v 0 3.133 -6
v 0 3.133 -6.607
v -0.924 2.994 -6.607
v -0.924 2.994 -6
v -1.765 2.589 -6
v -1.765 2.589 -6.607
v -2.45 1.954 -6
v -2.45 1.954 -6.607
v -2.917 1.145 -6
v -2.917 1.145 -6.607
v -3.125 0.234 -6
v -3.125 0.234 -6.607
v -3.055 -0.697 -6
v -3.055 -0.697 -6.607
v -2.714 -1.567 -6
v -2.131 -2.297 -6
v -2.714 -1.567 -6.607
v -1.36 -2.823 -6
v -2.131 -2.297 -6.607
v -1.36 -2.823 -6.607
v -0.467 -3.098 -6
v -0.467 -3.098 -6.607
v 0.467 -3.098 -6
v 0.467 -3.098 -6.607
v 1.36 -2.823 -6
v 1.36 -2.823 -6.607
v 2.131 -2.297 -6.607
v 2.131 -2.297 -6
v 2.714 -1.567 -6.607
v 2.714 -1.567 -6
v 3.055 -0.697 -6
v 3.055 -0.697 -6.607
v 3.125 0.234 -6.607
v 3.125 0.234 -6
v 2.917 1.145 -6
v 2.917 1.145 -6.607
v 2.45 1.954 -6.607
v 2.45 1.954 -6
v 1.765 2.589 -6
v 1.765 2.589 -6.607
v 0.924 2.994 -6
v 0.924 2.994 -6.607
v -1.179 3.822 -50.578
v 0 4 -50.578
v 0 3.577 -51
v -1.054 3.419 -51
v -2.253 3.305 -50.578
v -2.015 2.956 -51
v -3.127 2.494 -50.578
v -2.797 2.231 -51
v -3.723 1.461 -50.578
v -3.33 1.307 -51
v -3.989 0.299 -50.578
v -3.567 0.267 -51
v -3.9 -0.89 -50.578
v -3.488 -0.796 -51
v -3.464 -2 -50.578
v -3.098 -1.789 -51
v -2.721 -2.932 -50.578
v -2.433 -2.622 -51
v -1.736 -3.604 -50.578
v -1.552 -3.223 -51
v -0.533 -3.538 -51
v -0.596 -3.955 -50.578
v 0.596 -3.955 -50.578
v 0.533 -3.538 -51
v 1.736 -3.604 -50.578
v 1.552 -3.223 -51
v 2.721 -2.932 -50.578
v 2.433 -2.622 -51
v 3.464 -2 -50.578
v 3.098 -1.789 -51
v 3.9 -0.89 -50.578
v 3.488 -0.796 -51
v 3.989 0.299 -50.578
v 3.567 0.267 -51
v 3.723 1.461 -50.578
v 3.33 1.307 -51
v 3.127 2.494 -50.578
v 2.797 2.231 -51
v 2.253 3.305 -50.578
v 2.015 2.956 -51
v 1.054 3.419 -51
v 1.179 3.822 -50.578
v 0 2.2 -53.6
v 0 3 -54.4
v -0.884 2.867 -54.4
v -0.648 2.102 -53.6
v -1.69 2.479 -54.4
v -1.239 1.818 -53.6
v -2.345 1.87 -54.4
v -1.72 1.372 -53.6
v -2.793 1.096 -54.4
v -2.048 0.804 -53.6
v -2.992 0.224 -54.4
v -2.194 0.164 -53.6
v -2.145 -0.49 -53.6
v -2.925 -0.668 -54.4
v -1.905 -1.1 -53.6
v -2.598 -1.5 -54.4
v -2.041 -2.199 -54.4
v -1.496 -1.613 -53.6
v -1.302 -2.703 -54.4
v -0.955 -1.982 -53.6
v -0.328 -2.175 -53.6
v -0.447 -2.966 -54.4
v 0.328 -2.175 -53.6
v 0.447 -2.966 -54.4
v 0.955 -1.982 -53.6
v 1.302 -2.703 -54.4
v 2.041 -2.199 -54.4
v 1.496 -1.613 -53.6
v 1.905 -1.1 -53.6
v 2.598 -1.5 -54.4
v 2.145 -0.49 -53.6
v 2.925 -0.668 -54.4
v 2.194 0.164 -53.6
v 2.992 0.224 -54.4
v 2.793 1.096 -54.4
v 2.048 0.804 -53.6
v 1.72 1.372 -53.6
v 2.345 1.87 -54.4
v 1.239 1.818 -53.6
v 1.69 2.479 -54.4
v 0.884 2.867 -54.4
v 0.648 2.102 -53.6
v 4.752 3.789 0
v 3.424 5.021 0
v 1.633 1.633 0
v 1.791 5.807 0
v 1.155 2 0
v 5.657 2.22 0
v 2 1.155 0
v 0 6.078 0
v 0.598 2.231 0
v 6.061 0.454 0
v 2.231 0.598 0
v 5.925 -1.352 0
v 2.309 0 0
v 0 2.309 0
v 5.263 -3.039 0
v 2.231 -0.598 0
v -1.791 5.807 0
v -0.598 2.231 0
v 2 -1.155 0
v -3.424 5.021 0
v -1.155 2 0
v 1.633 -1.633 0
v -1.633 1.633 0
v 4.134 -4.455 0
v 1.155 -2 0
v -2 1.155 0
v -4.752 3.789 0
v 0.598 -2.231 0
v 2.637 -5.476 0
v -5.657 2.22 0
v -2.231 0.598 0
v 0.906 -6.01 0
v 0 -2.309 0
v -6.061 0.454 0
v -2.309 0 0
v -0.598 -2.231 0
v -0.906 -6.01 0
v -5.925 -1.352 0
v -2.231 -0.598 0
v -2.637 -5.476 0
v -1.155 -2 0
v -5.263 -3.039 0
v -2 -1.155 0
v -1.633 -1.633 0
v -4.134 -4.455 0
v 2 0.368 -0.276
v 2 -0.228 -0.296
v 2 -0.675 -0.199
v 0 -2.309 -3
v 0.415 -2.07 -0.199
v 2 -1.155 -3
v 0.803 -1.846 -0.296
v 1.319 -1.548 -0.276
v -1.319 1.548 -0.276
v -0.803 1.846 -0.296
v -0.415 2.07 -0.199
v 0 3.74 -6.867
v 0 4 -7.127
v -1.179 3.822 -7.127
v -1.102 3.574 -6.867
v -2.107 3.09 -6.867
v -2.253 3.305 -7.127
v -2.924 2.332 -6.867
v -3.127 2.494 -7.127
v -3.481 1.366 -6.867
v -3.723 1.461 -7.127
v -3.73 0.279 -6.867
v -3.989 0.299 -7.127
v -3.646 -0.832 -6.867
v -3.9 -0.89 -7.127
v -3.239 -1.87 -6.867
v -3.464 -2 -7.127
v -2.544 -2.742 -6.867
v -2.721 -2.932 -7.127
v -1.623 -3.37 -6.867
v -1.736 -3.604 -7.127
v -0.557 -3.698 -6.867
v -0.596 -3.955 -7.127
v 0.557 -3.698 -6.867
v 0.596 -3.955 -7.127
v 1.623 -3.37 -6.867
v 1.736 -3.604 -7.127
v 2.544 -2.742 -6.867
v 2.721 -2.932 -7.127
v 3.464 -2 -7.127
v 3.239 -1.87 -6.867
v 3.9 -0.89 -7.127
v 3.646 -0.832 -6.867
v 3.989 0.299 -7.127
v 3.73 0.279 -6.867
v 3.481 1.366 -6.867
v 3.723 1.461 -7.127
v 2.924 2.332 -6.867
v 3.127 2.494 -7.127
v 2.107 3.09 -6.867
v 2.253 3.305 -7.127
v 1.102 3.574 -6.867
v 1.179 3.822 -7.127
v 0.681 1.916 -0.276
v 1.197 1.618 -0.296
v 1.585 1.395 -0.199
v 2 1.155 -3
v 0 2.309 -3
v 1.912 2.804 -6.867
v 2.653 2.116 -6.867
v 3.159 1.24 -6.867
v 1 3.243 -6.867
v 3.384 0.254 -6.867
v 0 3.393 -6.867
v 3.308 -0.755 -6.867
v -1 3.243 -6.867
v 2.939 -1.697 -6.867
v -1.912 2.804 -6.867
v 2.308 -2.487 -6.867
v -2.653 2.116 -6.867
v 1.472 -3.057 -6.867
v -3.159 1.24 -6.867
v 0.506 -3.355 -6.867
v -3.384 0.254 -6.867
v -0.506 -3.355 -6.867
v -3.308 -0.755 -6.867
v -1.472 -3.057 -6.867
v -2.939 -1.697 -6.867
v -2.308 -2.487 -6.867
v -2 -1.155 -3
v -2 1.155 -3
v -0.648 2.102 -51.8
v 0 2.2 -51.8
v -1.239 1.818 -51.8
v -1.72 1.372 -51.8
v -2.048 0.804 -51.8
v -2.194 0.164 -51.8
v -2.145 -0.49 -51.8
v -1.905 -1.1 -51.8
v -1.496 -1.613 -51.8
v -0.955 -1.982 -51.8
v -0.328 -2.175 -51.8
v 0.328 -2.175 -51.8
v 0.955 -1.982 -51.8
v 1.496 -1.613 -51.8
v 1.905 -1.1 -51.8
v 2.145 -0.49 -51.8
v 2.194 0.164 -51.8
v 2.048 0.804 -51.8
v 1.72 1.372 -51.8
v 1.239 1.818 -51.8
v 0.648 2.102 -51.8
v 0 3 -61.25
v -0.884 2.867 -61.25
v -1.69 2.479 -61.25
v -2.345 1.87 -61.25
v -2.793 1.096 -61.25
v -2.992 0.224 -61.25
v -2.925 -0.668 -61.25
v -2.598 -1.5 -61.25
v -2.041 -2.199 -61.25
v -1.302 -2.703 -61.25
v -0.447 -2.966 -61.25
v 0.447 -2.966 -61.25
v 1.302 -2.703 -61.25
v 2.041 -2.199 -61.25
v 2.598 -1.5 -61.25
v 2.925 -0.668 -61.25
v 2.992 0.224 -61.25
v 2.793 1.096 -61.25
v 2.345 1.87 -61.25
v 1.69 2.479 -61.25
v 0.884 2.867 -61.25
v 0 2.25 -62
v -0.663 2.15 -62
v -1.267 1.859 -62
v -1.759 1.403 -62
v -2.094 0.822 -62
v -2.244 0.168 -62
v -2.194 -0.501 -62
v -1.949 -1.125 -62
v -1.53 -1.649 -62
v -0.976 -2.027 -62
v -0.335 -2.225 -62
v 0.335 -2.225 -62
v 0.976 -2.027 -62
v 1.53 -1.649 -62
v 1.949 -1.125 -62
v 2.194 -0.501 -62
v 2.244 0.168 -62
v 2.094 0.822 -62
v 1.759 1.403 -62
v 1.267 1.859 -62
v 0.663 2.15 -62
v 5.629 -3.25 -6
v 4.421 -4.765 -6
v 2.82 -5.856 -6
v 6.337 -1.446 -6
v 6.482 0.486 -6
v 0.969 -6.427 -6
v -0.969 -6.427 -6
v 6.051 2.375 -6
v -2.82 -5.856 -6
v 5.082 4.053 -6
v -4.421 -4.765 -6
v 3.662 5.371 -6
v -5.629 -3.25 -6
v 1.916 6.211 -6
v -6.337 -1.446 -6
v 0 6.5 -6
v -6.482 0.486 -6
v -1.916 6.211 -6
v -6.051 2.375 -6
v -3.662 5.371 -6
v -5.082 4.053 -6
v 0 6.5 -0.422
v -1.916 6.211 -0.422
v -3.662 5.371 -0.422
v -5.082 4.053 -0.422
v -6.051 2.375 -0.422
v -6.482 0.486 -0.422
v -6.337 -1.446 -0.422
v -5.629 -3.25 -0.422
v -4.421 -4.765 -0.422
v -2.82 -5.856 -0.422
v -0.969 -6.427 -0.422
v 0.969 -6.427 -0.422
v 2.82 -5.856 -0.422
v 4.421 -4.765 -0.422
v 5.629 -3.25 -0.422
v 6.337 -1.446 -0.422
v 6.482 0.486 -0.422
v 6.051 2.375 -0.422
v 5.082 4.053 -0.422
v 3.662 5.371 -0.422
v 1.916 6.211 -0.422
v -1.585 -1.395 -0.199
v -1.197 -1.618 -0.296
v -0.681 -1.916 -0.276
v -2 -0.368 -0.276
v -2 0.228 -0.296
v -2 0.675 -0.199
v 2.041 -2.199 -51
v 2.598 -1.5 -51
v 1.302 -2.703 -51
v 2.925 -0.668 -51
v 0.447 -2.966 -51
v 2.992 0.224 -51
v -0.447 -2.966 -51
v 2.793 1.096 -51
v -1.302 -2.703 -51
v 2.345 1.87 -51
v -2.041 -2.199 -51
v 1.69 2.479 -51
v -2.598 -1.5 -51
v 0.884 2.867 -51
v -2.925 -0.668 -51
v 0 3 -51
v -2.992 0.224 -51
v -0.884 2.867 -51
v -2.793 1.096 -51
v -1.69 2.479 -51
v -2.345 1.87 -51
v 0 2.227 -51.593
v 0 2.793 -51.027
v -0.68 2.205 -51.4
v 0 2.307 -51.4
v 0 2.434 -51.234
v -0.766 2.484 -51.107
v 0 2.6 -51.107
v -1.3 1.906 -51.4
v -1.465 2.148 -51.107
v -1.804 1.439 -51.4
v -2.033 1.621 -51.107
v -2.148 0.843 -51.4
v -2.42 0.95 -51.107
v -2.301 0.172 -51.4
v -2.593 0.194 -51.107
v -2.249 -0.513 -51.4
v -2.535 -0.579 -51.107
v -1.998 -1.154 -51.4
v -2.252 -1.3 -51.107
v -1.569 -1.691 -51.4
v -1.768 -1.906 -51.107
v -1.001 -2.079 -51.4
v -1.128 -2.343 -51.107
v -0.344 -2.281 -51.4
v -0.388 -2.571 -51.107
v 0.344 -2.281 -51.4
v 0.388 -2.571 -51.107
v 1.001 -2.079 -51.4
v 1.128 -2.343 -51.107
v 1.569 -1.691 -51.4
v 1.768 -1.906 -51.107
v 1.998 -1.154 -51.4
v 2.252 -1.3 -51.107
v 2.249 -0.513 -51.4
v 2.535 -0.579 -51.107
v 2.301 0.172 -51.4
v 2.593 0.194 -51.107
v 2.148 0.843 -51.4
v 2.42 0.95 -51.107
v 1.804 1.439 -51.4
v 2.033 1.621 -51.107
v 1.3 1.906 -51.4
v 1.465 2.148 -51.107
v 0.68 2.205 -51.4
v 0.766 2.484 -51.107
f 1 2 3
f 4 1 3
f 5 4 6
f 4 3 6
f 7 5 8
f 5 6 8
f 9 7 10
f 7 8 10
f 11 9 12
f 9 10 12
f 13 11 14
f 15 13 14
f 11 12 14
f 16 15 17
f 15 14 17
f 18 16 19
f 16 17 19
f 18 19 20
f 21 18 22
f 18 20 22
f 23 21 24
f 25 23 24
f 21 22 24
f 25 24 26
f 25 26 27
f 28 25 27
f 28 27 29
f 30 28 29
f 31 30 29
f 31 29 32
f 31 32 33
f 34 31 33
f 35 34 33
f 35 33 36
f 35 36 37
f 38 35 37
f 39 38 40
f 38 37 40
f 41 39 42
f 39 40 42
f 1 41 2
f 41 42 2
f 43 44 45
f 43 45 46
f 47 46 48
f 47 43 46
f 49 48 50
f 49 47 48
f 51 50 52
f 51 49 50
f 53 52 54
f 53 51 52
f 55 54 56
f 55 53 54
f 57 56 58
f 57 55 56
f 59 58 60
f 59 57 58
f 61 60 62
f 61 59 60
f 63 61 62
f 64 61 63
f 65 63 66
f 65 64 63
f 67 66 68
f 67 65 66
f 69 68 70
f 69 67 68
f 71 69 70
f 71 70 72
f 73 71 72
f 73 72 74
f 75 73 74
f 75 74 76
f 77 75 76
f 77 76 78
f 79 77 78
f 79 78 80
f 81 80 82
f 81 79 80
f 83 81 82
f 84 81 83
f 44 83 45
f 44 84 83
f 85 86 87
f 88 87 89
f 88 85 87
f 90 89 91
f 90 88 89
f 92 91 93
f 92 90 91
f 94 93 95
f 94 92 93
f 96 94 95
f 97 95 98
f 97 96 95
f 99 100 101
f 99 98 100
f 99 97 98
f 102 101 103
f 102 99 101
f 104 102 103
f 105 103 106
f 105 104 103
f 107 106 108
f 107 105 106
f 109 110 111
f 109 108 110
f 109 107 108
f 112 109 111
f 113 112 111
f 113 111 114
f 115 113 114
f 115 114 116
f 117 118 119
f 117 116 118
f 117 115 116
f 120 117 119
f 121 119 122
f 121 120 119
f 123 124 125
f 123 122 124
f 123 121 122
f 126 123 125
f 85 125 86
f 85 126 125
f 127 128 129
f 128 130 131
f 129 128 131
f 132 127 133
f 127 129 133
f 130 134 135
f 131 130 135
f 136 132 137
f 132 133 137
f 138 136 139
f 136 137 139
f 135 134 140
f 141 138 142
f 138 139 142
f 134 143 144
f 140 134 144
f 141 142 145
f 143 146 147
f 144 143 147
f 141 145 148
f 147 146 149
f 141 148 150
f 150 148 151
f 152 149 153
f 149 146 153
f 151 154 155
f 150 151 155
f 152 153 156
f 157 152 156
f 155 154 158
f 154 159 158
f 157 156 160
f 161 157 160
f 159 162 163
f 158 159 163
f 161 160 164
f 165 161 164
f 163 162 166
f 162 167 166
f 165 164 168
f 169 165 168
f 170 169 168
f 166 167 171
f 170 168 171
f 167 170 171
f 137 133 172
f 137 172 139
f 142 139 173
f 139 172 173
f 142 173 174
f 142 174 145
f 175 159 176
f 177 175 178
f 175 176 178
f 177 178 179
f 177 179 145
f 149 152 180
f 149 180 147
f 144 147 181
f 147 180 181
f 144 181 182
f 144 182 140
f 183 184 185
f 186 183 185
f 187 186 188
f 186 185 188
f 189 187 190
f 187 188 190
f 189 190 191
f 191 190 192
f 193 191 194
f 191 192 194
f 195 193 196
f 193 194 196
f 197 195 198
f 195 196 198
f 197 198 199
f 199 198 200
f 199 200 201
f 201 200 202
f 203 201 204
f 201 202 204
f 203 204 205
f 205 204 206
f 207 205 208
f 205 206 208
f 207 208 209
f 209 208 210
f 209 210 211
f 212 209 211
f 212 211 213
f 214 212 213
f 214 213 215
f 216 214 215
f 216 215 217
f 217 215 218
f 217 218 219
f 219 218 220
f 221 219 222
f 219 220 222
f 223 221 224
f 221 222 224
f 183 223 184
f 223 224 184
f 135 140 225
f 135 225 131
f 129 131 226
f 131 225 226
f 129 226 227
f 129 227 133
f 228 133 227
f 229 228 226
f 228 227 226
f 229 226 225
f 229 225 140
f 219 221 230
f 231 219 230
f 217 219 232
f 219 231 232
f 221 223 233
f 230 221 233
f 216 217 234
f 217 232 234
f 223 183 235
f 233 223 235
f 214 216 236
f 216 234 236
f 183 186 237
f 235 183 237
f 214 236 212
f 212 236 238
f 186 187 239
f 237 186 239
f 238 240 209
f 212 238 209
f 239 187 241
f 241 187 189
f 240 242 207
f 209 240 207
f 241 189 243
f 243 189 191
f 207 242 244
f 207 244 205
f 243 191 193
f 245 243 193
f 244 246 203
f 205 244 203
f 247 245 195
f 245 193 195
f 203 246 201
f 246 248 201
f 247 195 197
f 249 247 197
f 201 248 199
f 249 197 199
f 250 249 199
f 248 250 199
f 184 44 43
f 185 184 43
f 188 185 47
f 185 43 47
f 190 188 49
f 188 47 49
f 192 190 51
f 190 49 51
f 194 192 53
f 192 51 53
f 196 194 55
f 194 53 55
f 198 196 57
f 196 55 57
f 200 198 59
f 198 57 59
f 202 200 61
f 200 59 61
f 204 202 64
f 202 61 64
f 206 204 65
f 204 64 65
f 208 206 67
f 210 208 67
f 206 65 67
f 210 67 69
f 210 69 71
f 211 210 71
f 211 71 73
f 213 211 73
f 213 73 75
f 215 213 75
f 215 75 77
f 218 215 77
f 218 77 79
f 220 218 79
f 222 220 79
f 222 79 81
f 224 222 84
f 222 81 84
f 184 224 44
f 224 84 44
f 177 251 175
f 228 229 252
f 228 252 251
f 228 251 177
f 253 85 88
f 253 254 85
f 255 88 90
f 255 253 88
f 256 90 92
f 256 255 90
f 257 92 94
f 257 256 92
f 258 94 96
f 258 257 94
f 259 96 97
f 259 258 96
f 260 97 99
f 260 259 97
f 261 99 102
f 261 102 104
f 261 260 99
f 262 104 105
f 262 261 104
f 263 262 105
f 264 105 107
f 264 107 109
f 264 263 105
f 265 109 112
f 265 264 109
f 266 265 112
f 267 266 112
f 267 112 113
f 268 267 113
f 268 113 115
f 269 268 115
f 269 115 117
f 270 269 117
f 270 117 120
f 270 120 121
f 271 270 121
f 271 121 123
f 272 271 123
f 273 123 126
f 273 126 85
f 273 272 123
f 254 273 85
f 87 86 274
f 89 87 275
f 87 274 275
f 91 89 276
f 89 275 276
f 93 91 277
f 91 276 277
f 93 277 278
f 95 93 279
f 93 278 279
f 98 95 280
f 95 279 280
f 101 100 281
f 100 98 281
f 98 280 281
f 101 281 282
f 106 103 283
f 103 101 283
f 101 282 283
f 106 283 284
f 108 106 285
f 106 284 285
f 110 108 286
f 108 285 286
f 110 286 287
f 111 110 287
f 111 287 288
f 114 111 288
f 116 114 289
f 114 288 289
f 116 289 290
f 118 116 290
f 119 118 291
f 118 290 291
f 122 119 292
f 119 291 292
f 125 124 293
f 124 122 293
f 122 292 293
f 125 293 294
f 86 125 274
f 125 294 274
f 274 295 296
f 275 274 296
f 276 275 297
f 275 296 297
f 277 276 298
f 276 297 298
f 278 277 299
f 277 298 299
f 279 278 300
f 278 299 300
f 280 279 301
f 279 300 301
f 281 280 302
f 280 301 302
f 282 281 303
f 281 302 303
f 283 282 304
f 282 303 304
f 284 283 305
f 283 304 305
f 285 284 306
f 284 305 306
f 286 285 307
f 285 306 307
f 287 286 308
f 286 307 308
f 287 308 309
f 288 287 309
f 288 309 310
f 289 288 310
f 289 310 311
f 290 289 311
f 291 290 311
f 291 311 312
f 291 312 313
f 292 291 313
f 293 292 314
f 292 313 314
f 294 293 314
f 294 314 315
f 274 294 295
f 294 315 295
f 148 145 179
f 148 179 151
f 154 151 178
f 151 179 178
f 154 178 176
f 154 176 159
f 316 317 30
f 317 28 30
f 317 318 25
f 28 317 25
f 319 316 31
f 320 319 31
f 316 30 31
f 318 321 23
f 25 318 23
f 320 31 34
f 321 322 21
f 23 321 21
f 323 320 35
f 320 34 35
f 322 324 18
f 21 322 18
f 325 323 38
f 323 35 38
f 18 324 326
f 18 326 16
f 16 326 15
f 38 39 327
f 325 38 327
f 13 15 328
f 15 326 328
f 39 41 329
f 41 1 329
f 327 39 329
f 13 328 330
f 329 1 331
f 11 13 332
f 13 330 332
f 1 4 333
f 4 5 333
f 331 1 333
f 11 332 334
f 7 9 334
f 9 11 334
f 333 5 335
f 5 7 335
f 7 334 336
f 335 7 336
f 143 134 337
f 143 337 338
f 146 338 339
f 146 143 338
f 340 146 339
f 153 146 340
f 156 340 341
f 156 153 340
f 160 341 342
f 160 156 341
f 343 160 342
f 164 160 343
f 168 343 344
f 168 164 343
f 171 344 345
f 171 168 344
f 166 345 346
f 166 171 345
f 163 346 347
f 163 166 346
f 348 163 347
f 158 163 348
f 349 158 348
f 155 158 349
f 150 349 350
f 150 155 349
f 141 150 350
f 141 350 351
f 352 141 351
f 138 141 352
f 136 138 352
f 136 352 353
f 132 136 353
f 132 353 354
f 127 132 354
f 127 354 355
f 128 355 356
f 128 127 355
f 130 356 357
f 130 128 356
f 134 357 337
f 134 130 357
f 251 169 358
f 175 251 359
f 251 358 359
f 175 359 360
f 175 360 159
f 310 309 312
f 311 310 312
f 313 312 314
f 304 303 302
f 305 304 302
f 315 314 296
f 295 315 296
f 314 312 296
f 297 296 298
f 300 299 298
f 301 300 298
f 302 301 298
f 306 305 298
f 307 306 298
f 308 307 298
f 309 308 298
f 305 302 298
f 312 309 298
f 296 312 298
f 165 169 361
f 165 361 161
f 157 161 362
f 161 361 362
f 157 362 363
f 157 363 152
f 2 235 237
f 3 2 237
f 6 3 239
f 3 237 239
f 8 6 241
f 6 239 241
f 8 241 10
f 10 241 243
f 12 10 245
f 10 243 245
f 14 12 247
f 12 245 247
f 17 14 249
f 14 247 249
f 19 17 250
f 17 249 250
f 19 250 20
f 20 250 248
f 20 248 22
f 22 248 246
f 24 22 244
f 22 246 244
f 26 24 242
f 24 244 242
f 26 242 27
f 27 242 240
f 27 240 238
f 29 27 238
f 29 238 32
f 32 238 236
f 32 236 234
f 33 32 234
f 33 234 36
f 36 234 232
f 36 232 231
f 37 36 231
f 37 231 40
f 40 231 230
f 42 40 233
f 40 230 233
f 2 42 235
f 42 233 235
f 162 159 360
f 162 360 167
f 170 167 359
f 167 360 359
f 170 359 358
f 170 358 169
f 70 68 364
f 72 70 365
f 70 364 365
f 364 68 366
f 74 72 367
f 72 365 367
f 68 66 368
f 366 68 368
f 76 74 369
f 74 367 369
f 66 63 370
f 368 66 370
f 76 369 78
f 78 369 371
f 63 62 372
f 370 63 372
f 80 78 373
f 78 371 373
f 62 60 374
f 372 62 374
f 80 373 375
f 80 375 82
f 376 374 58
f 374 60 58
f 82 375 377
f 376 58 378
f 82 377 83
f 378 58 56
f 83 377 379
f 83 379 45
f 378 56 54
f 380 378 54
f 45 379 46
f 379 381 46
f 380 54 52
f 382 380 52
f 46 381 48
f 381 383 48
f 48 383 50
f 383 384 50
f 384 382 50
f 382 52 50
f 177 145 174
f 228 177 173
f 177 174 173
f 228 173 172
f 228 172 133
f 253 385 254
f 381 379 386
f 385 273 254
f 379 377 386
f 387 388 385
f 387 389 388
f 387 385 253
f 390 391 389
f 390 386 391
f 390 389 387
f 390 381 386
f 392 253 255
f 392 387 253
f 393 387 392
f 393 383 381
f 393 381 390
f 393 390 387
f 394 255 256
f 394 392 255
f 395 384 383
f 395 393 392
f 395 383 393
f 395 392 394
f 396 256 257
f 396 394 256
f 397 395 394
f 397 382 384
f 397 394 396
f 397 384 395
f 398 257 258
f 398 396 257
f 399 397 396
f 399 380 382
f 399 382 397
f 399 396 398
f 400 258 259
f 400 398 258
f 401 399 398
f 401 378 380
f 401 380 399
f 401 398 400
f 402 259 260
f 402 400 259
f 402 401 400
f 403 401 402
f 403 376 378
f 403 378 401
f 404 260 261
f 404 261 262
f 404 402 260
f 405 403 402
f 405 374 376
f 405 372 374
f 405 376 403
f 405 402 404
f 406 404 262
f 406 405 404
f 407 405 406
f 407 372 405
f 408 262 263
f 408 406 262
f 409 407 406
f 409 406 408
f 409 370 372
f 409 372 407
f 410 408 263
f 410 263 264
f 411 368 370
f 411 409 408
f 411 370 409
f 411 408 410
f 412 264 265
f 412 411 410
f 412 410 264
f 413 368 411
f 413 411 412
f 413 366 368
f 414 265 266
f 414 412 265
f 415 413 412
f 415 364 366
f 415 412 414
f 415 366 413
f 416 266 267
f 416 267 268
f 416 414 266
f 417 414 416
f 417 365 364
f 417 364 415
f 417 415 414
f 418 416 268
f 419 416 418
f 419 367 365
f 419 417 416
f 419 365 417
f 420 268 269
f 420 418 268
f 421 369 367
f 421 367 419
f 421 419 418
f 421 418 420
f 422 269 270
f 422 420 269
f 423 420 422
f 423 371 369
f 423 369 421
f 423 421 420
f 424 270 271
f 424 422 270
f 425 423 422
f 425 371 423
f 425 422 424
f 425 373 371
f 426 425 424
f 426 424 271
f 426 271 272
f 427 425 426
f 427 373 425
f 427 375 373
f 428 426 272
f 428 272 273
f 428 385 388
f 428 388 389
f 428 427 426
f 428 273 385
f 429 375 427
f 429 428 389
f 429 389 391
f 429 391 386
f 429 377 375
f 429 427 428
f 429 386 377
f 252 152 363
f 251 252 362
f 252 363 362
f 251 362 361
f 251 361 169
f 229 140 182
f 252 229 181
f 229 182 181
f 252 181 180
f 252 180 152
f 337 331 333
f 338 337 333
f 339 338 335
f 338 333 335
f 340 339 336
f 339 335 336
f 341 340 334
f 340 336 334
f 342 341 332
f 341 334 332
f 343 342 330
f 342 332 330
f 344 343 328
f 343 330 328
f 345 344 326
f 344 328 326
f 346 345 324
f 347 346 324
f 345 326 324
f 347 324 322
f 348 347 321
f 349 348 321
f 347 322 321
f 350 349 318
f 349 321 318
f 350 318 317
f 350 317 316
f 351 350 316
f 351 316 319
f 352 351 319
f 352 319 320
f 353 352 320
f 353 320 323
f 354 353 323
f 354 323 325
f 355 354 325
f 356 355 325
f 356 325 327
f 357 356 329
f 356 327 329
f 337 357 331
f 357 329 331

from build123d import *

# Parameters (mm, degrees)
SKETCH12_W         = 0.866666667
SKETCH12_H         = 0.866666667
CHAMFER3_SIZE      = 0.26
CHAMFER1_SIZE      = 0.75
CHAMFER2_SIZE      = 0.4225
CUT_EXTRUDE2_DEPTH = 3


with BuildPart() as part:
    # Sketch1 → Revolve1 (revolve)
    with BuildSketch(Plane(origin=(0, 0, 0), x_dir=(0, 0, -1), z_dir=(1, 0, 0))):
        Polygon((0, 6.5), (6, 6.5), (6, 4), (51, 4), (51, 3), (62, 3), (62, 0), (0, 0), align=None)
    revolve(axis=Axis((0, 0, -62), (0, 0, 1)))

    # Sketch12 → Cut-Revolve2 (revolve, cut)
    with BuildSketch(Plane(origin=(0, 0, 0), x_dir=(0, 0, -1), z_dir=(1, 0, 0))):
        with Locations((6.433333334, 3.566666667)):
            Rectangle(SKETCH12_W, SKETCH12_H)
    revolve(axis=Axis((0, 0, -62), (0, 0, 1)), mode=Mode.SUBTRACT)

    # Chamfer3
    chamfer3_edges = [part.edges().sort_by_distance(p)[0] for p in [
        (0, -3.133333333, -6.866666667),
        (0, -4, -6.866666667),
    ]]
    chamfer(chamfer3_edges, length=CHAMFER3_SIZE)

    # Sketch5 → Cut-Revolve1 (revolve, cut)
    with BuildSketch(Plane(origin=(0, 0, 0), x_dir=(0, 0, -1), z_dir=(1, 0, 0))):
        with BuildLine():
            Line((51, 4), (55.4, 4))
            Line((55.4, 4), (53.6, 2.2))
            Line((53.6, 2.2), (51.8, 2.2))
            ThreePointArc((51.8, 2.2), (51.234314575, 2.434314575), (51, 3))
            Line((51, 3), (51, 4))
        make_face()
    revolve(axis=Axis((0, 0, -62), (0, 0, 1)), mode=Mode.SUBTRACT)

    # Chamfer1
    chamfer1_edges = [part.edges().sort_by_distance(p)[0] for p in [
        (0, -3, -62),
    ]]
    chamfer(chamfer1_edges, length=CHAMFER1_SIZE)

    # Chamfer2
    chamfer2_edges = [part.edges().sort_by_distance(p)[0] for p in [
        (0, -4, -51),
        (0, -6.5, 0),
    ]]
    chamfer(chamfer2_edges, length=CHAMFER2_SIZE)

    # Sketch8 → Cut-Extrude2 (cut)
    with BuildSketch(Plane.XY):
        Polygon((2, 1.154700538), (0, 2.309401077), (-2, 1.154700538), (-2, -1.154700538), (0, -2.309401077), (2, -1.154700538), align=None)
    extrude(amount=-CUT_EXTRUDE2_DEPTH, mode=Mode.SUBTRACT)

    # Cut-Extrude4 cone 1 section (through the dimple's axis) → Cut-Extrude4 (revolve, cut)
    with BuildSketch(Plane(origin=(0, 0, 0), x_dir=(0, -1, 0), z_dir=(1, 0, 0))):
        Polygon((0, 0), (2.309401077, 0), (0, 2.309401077), align=None)
    revolve(axis=Axis((0, 0, 0), (0, 0, -1)), mode=Mode.SUBTRACT)


solid = part.part
